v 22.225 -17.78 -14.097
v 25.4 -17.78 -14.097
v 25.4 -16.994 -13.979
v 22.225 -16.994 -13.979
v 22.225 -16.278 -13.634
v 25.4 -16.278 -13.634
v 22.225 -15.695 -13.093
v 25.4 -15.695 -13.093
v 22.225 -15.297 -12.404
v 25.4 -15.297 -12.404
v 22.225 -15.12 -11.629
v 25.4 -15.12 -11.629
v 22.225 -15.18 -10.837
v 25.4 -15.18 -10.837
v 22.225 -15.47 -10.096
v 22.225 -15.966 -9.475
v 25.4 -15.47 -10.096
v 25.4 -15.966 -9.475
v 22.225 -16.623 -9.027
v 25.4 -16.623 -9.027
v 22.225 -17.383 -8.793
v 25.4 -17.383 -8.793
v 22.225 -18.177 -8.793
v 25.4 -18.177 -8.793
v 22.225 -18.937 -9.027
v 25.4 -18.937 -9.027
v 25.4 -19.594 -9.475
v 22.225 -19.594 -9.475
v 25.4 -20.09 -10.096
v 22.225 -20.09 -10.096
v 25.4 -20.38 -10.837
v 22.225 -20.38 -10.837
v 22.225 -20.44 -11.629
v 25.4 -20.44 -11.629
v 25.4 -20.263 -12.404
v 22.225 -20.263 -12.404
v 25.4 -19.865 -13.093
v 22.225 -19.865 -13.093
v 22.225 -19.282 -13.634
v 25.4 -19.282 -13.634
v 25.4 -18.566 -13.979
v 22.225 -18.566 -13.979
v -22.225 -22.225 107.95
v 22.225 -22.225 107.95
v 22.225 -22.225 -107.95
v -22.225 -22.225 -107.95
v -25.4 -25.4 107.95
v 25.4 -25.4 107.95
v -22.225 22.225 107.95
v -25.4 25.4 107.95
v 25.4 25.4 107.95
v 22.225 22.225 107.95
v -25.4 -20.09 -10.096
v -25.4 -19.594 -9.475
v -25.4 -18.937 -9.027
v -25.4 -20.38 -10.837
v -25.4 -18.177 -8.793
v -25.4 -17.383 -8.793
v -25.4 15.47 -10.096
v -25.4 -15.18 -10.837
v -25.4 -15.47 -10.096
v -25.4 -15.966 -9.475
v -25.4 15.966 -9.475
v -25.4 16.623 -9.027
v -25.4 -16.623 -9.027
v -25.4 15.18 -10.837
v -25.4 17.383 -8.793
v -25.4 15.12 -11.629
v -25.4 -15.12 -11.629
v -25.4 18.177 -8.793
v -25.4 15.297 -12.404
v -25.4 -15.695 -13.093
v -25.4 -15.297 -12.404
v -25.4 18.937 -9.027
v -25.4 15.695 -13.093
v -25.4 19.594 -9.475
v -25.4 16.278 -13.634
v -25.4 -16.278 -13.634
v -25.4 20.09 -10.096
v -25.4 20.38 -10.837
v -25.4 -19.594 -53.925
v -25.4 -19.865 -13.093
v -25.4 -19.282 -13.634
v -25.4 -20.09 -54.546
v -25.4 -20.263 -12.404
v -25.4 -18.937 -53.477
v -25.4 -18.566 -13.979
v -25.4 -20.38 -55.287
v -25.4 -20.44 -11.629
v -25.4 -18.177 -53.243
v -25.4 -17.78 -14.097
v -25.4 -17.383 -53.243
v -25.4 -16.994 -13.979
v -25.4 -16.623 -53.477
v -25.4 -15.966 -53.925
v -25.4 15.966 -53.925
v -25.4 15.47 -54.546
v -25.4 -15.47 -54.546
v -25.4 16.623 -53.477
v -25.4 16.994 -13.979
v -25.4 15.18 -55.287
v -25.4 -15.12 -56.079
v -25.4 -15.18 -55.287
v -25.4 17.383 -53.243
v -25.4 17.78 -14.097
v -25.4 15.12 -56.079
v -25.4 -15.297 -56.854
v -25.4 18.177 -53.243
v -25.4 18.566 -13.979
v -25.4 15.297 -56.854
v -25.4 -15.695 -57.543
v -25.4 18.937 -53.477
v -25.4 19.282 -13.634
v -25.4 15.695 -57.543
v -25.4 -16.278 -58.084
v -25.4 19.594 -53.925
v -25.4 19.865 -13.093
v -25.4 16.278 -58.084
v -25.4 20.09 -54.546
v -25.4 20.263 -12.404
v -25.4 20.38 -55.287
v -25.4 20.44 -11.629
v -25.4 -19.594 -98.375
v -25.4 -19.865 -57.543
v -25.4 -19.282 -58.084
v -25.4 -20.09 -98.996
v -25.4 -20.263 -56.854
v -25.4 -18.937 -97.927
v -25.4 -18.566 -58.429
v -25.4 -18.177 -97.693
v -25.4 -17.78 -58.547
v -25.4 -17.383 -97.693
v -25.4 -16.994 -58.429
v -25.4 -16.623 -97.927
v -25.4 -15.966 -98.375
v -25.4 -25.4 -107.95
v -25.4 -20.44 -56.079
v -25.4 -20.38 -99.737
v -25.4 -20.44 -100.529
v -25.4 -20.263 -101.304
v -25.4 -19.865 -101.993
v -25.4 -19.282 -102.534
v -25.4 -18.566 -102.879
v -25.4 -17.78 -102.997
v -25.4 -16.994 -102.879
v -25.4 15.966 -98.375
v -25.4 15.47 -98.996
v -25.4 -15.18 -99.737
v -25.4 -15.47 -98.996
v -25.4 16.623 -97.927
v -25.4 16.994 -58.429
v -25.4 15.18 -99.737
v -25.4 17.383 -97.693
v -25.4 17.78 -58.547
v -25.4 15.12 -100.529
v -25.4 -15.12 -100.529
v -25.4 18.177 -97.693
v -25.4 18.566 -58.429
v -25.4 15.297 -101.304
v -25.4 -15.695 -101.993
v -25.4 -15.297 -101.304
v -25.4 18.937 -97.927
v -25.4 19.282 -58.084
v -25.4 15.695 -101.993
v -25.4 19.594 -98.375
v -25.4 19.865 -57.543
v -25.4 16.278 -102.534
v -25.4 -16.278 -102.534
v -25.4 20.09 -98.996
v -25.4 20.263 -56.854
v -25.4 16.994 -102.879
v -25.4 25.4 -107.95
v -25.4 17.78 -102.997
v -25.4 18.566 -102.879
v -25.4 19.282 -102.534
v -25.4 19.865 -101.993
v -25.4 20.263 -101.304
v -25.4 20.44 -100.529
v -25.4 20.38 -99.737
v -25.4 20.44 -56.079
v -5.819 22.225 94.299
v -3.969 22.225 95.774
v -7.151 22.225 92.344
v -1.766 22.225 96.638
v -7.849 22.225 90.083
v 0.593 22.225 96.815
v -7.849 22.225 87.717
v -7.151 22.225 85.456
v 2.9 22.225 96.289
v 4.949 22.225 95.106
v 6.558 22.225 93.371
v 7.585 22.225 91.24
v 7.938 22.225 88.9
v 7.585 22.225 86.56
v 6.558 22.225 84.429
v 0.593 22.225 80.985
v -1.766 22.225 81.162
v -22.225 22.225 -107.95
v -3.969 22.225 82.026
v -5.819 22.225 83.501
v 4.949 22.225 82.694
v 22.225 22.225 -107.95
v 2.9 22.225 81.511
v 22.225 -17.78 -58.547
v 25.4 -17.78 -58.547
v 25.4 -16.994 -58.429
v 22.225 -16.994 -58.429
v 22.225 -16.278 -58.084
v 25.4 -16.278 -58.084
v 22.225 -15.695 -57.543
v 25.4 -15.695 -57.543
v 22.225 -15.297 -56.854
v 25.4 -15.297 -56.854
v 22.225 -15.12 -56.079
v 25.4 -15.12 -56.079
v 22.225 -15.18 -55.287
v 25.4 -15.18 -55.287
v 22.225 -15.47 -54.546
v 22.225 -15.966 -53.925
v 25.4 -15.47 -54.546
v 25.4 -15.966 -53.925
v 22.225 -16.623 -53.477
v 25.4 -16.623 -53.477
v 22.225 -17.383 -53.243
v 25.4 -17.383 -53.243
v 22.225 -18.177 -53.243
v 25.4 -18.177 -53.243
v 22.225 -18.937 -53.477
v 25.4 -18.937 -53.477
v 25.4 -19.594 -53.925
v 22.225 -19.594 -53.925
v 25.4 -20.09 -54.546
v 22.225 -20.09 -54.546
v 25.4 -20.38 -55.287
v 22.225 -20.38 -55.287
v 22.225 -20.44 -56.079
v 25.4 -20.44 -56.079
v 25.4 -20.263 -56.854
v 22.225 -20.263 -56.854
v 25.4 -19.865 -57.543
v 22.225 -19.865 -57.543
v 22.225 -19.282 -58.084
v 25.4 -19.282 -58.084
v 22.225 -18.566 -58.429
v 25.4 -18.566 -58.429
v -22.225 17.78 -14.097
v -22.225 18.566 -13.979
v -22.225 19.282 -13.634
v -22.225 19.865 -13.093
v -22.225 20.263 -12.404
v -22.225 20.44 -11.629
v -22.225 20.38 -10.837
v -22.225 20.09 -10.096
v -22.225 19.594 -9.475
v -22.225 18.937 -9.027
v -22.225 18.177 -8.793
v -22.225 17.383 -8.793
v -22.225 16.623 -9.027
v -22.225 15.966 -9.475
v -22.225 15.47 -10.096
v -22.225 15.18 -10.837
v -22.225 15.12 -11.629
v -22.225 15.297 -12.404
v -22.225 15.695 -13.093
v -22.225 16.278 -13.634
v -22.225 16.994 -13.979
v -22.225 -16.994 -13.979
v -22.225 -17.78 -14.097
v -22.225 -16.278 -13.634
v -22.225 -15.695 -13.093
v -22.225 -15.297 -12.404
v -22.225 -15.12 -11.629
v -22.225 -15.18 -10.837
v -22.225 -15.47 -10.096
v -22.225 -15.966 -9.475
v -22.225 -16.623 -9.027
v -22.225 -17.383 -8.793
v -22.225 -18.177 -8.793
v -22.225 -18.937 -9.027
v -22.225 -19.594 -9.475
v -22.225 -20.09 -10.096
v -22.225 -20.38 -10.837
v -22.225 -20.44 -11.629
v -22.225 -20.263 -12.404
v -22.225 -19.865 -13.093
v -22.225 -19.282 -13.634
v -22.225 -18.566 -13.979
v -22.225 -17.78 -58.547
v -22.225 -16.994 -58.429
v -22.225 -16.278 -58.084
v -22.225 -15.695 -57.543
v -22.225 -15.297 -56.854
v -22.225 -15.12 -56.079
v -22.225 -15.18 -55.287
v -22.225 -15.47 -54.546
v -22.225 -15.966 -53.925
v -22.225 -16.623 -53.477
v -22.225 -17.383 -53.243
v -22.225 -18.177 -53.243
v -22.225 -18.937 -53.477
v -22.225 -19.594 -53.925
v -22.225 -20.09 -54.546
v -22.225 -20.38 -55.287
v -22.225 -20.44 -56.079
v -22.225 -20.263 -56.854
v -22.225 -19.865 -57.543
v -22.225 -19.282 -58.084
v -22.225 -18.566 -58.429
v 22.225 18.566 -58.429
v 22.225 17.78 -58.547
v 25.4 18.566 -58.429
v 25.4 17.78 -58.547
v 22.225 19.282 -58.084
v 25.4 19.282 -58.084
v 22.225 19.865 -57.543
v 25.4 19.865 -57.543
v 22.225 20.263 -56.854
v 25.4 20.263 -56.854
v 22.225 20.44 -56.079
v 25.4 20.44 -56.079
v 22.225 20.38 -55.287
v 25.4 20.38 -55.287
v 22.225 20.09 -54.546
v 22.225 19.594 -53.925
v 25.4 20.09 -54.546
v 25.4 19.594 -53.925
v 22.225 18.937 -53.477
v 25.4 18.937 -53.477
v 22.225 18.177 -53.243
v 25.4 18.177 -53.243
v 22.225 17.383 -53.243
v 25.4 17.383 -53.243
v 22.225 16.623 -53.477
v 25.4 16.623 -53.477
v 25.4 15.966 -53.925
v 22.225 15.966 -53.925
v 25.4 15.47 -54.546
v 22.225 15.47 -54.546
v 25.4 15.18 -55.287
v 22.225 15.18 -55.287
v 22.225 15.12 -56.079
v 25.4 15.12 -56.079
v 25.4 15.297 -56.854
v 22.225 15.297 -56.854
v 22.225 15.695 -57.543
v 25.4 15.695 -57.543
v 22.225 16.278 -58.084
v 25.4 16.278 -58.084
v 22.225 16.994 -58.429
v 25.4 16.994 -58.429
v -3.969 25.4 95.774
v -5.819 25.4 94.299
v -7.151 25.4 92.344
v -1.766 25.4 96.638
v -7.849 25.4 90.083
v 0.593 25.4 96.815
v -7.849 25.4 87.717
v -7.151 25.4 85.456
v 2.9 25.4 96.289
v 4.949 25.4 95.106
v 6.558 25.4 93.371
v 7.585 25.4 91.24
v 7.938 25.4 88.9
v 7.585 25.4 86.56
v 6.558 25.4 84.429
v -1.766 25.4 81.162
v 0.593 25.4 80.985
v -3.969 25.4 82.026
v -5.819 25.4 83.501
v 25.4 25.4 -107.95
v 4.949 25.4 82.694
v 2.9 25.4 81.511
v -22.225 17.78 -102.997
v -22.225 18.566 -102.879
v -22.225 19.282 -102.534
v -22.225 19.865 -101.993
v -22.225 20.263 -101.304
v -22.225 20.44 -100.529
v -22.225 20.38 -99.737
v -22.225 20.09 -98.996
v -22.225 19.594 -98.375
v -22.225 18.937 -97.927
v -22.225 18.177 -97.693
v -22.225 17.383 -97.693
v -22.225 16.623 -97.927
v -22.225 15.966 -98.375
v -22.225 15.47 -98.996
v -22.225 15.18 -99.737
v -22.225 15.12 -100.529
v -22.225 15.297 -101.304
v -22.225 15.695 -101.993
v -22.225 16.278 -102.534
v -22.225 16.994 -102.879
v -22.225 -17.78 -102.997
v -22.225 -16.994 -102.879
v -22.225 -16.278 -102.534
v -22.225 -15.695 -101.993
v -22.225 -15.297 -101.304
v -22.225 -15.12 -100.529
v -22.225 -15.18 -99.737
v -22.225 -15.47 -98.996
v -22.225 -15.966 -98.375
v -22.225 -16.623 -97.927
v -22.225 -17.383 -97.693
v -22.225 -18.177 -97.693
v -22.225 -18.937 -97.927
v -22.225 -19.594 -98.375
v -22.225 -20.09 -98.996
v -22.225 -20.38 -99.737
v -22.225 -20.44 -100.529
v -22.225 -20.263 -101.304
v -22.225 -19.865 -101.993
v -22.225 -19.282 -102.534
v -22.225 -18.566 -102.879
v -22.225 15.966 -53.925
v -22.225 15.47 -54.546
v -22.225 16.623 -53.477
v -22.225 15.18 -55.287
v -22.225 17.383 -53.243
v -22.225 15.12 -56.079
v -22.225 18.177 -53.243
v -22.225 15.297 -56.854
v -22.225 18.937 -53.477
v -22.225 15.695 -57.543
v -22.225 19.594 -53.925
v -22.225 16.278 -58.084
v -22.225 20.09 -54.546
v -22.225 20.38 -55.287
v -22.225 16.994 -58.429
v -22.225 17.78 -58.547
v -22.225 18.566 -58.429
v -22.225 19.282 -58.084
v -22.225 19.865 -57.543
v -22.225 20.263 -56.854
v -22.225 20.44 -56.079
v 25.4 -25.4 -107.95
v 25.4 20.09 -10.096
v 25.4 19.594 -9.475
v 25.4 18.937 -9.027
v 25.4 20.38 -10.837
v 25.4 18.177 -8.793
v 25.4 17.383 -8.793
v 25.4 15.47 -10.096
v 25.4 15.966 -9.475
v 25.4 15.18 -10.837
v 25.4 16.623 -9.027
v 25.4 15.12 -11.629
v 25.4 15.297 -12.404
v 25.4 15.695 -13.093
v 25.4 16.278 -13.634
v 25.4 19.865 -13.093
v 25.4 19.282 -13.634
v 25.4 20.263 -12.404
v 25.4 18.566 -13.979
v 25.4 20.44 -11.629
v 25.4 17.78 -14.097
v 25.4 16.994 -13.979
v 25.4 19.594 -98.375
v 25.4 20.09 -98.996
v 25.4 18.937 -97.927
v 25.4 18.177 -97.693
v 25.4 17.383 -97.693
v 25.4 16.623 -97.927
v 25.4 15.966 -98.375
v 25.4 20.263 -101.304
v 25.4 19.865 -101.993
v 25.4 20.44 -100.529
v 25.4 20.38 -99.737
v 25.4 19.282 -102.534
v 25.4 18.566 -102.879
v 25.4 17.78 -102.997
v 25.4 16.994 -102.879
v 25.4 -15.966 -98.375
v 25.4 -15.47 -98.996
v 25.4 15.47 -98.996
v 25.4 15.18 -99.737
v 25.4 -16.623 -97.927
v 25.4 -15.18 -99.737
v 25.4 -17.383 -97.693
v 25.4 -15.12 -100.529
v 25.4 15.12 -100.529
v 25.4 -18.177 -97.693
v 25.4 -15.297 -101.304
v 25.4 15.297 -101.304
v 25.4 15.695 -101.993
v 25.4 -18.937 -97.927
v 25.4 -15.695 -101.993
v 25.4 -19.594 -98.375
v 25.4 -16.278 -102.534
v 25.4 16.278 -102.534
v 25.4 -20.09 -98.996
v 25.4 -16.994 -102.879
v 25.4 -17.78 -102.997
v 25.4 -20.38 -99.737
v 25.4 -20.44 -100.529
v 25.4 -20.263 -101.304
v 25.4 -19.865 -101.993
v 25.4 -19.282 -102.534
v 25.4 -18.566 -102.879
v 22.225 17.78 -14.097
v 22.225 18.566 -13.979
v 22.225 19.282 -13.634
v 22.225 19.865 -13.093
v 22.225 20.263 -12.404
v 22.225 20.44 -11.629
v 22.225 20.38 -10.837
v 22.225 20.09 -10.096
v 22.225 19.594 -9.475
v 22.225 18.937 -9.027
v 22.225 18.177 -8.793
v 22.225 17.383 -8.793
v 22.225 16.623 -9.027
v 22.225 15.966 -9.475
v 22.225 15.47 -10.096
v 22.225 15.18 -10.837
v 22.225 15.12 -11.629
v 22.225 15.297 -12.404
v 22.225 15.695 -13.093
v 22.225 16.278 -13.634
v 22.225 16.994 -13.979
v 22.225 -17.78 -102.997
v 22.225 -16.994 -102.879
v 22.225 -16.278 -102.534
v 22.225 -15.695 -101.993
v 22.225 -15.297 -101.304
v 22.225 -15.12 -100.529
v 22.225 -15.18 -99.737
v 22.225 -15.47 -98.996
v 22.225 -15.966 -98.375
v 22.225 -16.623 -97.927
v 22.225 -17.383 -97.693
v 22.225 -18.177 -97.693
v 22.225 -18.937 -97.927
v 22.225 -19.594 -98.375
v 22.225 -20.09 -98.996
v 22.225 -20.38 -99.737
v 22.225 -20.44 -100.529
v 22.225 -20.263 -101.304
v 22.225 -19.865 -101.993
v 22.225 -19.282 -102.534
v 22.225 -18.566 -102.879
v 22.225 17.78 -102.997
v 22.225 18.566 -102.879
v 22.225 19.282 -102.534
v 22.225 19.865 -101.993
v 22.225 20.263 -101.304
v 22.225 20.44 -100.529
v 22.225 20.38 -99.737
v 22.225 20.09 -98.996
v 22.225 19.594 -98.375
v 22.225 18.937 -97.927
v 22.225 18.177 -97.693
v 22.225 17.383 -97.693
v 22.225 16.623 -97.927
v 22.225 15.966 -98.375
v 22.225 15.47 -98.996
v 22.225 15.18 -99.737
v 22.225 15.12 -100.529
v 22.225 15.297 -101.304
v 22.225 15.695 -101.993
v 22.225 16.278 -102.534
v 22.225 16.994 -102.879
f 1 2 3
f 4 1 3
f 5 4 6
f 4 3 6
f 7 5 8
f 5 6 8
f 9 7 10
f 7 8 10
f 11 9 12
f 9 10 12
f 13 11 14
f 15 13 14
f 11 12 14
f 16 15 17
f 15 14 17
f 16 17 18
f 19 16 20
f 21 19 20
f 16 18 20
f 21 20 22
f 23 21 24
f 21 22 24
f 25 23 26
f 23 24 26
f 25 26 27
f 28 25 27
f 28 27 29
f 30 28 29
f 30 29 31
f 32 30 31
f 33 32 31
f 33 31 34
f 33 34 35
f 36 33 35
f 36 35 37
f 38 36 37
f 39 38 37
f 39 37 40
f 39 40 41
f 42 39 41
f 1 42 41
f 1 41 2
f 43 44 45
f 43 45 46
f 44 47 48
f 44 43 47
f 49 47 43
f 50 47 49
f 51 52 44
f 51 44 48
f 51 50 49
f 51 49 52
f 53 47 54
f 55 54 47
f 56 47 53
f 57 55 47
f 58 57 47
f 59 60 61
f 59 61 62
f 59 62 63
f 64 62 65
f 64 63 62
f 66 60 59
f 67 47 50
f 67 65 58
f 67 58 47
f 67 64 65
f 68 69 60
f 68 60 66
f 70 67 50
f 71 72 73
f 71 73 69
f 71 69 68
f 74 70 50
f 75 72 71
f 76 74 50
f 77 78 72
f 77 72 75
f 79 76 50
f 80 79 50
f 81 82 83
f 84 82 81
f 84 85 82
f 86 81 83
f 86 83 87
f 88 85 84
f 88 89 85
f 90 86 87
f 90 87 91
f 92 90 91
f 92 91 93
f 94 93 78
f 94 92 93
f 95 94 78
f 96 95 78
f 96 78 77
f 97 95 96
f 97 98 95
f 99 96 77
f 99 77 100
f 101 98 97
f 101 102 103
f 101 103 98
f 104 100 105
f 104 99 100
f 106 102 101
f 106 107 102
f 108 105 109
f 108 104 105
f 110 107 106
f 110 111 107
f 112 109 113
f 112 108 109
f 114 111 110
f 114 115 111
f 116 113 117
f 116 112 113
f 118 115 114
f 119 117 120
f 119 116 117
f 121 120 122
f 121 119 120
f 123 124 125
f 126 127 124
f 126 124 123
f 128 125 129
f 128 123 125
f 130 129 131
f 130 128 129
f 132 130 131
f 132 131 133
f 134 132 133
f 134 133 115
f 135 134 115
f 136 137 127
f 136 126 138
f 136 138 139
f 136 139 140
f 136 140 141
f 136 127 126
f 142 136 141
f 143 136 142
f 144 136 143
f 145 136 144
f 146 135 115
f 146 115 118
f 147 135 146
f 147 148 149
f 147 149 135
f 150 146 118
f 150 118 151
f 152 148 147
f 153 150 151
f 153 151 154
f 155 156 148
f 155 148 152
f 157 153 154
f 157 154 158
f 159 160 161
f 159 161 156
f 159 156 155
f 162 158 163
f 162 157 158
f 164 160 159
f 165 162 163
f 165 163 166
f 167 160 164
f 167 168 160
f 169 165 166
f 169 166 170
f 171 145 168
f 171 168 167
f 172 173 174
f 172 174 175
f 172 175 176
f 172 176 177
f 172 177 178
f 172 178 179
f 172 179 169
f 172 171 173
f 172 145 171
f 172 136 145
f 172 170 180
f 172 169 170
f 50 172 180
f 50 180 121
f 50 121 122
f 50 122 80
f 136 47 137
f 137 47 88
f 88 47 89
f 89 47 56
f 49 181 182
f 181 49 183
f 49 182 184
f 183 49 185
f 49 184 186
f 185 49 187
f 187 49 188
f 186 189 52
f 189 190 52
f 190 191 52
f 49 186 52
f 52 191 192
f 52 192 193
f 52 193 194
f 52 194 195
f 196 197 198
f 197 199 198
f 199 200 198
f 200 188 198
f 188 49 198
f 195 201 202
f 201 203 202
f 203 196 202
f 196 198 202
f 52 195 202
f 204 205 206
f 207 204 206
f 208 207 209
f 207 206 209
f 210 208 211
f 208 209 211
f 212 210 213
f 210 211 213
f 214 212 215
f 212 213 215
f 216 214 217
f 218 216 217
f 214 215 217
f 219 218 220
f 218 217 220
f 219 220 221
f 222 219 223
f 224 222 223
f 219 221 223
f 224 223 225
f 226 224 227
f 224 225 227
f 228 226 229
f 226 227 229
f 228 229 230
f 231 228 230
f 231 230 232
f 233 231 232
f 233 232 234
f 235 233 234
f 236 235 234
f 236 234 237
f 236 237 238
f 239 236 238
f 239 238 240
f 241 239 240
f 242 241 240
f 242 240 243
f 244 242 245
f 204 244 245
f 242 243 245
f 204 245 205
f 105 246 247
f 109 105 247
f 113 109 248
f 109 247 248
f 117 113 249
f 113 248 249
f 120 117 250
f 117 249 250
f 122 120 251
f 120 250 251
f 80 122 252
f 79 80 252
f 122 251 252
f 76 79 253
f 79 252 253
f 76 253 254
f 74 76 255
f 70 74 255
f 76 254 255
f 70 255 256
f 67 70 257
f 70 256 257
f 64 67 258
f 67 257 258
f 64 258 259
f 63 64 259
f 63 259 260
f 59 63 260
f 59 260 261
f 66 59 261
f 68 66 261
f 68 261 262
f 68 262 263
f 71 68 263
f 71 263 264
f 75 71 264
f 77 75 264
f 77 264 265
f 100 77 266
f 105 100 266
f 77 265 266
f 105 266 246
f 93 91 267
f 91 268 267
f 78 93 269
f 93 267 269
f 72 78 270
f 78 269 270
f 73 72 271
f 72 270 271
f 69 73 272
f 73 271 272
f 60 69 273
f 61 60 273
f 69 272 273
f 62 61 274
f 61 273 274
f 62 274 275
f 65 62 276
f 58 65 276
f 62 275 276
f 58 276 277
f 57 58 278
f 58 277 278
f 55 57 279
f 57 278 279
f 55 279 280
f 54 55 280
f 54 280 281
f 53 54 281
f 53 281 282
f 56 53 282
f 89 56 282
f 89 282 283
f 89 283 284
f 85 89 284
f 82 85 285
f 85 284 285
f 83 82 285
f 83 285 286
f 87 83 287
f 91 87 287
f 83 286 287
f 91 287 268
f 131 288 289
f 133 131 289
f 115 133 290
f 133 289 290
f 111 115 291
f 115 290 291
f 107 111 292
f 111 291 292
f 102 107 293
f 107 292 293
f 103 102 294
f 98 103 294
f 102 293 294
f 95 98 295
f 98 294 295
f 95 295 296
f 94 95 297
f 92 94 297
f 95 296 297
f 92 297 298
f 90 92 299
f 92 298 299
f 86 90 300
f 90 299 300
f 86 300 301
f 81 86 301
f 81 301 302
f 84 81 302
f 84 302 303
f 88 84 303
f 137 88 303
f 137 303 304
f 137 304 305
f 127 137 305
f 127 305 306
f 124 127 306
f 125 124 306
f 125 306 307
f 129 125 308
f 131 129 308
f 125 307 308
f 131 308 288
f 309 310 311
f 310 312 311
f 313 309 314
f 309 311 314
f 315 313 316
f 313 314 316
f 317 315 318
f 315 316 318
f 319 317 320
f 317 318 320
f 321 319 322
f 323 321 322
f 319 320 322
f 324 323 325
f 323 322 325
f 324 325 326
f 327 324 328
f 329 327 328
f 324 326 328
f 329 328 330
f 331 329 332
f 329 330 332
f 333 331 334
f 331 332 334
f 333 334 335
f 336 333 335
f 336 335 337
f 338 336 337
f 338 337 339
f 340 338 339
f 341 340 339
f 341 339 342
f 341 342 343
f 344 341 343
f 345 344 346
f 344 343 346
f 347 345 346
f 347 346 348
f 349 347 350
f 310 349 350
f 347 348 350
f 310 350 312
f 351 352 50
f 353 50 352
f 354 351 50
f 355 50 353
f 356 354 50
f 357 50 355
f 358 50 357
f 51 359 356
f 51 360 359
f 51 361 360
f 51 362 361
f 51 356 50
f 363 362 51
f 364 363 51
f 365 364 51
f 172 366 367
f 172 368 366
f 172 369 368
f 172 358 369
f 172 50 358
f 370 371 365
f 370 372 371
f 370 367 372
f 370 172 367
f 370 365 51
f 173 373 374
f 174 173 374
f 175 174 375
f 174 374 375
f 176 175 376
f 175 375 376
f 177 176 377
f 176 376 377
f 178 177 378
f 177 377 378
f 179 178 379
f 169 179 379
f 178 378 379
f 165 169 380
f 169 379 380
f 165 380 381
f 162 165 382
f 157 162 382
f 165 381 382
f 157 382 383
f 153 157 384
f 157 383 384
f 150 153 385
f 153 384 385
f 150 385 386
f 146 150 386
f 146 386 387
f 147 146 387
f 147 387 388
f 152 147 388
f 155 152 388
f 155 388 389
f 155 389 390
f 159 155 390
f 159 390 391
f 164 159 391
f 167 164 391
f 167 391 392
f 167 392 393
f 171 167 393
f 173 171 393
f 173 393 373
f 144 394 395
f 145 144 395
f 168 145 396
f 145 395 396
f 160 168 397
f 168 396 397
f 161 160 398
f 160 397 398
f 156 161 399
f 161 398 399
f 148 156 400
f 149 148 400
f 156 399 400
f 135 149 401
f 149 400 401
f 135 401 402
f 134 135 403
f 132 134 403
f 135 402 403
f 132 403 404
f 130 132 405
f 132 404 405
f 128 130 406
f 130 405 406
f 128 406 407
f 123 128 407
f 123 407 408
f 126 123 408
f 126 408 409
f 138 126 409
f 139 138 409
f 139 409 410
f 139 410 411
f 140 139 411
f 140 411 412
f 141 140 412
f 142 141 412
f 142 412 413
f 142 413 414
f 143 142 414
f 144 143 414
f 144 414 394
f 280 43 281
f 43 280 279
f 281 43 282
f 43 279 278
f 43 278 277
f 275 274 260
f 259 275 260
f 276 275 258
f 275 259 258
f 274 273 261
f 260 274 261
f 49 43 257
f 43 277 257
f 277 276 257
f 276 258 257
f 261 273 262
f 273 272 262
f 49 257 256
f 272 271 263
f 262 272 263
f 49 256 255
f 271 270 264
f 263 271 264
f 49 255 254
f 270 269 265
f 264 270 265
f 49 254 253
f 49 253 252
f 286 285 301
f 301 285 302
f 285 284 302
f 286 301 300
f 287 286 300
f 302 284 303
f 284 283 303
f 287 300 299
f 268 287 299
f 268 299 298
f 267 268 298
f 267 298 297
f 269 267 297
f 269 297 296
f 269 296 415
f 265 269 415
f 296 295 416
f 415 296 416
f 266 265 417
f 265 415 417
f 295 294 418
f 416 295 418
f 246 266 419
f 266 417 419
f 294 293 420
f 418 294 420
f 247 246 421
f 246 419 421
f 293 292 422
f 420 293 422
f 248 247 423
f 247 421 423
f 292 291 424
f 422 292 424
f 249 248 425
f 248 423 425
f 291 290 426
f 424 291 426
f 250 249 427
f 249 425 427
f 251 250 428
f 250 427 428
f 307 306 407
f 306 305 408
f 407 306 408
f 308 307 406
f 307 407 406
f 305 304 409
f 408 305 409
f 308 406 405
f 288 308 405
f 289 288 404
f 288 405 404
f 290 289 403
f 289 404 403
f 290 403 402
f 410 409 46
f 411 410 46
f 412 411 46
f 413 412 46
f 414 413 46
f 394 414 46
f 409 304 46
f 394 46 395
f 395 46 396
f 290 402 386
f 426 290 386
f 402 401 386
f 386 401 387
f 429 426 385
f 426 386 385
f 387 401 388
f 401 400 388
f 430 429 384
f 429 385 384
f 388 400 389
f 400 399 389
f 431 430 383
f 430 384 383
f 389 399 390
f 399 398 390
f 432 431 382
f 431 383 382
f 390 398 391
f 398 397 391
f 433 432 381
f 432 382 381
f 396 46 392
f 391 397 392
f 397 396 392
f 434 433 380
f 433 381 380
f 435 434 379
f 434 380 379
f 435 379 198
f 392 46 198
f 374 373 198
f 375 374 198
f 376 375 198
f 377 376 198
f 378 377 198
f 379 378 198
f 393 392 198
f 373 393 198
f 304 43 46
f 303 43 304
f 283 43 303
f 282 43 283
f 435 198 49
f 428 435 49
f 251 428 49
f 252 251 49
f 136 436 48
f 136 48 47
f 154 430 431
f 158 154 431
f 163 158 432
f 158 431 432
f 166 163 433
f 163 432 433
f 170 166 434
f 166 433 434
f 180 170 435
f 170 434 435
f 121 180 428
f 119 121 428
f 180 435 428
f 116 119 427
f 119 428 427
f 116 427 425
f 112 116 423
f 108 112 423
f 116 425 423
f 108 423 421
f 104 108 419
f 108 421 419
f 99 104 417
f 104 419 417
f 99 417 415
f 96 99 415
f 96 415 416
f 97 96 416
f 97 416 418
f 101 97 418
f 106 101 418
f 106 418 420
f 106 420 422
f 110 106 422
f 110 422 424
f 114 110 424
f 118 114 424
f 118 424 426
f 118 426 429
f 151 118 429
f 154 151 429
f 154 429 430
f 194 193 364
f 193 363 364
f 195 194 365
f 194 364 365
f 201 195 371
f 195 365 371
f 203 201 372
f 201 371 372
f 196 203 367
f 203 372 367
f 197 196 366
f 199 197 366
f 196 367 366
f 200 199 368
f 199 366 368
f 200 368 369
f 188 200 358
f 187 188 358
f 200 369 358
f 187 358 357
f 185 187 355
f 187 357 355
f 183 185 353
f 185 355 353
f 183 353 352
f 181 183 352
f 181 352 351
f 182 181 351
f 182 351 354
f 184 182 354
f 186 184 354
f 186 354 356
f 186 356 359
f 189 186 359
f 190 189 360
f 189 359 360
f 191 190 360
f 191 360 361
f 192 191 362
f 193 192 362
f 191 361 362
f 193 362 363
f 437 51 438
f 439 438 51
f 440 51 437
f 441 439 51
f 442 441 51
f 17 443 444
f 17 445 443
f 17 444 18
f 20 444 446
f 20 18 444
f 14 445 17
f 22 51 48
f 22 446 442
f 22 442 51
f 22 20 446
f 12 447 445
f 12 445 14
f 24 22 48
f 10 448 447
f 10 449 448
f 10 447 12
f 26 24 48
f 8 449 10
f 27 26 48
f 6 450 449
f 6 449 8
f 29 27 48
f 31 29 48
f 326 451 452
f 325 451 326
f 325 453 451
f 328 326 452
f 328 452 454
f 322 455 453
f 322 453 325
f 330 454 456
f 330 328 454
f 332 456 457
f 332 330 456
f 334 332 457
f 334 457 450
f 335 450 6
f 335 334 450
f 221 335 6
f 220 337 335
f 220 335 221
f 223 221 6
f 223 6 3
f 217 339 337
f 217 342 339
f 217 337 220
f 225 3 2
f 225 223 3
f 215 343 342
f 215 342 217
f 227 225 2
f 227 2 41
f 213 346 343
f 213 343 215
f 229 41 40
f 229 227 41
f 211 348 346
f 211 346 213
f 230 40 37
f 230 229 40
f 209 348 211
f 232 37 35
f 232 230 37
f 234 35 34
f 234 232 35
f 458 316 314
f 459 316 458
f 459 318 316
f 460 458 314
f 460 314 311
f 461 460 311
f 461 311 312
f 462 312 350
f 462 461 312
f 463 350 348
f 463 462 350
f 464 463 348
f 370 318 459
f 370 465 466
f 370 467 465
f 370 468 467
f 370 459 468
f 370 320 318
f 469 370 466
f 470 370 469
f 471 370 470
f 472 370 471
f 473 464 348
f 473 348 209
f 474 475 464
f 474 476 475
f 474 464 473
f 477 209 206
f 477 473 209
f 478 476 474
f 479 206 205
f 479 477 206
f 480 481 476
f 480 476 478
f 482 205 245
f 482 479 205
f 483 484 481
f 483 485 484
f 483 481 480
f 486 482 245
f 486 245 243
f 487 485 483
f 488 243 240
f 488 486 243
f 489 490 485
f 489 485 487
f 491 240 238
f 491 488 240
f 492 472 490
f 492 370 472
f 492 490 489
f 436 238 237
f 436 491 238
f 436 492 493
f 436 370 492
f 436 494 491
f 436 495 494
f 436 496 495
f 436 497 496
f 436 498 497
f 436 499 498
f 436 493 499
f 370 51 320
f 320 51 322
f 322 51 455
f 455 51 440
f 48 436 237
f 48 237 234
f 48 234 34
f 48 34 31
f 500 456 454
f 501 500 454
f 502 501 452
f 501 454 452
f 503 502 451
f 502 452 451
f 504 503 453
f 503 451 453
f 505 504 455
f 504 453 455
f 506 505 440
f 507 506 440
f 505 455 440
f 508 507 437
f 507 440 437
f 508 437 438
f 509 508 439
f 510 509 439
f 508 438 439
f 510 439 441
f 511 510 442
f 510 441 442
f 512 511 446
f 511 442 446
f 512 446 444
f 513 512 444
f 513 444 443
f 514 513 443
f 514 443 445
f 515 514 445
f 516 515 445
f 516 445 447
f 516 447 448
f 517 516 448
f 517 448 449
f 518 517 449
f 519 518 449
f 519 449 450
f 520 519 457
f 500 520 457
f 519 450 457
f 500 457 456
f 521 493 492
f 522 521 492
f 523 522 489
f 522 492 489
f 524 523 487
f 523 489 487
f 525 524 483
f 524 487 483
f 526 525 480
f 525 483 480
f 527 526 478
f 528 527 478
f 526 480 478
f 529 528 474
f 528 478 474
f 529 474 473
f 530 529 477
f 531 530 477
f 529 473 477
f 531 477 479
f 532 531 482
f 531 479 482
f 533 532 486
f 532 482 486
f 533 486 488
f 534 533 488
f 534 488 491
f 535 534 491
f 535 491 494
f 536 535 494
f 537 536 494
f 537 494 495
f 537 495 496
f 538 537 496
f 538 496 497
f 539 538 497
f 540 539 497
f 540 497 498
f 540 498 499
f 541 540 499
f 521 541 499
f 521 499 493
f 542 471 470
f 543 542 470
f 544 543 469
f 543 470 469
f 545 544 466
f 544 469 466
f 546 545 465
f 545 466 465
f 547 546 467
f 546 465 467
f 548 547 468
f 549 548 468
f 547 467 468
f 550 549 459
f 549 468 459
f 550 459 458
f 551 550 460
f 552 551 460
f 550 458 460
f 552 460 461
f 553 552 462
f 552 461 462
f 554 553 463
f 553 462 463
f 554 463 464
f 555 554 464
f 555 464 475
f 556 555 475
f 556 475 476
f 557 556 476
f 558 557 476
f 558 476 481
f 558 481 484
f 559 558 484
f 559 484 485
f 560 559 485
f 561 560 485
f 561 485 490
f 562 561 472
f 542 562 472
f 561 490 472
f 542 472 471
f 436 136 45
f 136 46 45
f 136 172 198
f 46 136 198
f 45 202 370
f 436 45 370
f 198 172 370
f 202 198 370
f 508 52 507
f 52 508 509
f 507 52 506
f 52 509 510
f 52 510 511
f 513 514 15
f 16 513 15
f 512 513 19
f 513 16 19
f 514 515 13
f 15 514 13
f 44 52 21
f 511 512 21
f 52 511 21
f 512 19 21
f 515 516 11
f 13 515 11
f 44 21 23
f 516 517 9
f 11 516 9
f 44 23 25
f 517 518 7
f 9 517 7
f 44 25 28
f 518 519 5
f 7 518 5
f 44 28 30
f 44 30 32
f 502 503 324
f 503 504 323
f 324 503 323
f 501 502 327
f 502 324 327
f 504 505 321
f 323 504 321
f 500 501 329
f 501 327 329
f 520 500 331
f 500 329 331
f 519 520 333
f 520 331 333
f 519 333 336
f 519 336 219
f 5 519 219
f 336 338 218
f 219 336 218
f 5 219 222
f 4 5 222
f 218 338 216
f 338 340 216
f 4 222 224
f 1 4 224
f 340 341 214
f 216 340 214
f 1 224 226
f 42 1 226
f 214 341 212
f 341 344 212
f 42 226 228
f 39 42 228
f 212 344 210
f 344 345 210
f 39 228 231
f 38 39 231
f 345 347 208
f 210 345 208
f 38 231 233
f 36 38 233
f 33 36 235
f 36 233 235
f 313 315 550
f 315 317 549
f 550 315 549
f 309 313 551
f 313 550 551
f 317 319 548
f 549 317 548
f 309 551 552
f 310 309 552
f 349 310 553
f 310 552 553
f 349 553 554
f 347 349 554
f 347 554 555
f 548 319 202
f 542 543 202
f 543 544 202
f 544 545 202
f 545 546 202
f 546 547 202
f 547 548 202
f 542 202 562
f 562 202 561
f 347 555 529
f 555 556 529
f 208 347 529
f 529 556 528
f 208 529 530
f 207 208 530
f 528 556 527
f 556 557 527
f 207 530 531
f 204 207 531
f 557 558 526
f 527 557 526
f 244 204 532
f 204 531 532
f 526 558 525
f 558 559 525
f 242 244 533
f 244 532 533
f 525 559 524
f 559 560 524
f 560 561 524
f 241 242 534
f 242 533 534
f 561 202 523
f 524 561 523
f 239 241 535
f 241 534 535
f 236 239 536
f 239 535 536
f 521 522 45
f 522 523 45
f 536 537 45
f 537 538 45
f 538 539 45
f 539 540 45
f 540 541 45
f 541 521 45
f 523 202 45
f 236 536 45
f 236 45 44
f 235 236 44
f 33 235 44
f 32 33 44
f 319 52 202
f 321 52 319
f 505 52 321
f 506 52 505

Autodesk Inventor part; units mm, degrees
ref_plane "YZ Plane" through (0, 0, 0) normal (1, 0, 0) x (0, 1, 0)
ref_plane "XZ Plane" through (0, 0, 0) normal (0, 1, 0) x (-1, 0, 0)
ref_plane "XY Plane" through (0, 0, 0) normal (0, 0, 1) x (1, 0, 0)
sketch "Sketch1" plane through (0, 0, 0) normal (0, 0, 1) x (1, 0, 0)
  line L0 (-35.56, 0) -> (35.56, 0) construction
  line L1 (0, -35.56) -> (0, 35.56) construction
  line L2 (-25.4, 25.4) -> (25.4, 25.4)
  line L3 (25.4, 25.4) -> (25.4, -25.4)
  line L4 (25.4, -25.4) -> (-25.4, -25.4)
  line L5 (-25.4, -25.4) -> (-25.4, 25.4)
  line L6 (-22.225, 22.225) -> (22.225, 22.225)
  line L7 (22.225, 22.225) -> (22.225, -22.225)
  line L8 (22.225, -22.225) -> (-22.225, -22.225)
  line L9 (-22.225, -22.225) -> (-22.225, 22.225)
  point P0 (0, 0)
  point P1 (-25.4, 0)
  point P2 (0, 25.4)
  point P3 (-22.225, 0)
  point P4 (0, 22.225)
  dimension "d0" = 50.8
  dimension "d1" = 3.175
extrude "Extrusion1" add sketch "Sketch1" along normal mid plane 215.9
sketch "Sketch2" plane through (25.4, -25.4, 107.95) normal (1, 0, 0) x (0, 0, -1)
  line L0 (268.3764, 25.4) -> (-44.7294, 25.4) construction
  line L1 (107.95, -10.16) -> (107.95, 60.96) construction
  line L2 (119.38, 7.62) -> (208.28, 7.62) construction
  line L3 (208.28, 7.62) -> (208.28, 43.18) construction
  line L4 (208.28, 43.18) -> (119.38, 43.18) construction
  line L5 (119.38, 43.18) -> (119.38, 7.62) construction
  circle A0 centre (119.38, 43.18) radius 2.667
  circle A1 centre (119.38, 7.62) radius 2.667
  circle A2 centre (163.83, 7.62) radius 2.667
  circle A3 centre (208.28, 7.62) radius 2.667
  circle A4 centre (208.28, 43.18) radius 2.667
  circle A5 centre (163.83, 43.18) radius 2.667
  line L6 (215.9, 50.8) -> (215.9, 0) construction
  point P0 (107.95, 25.4)
  point P1 (208.28, 25.4)
  dimension "d4" = 5.334
  dimension "d5" = 7.62
  dimension "d6" = 88.9
  dimension "d7" = 17.78
extrude "Extrusion2" cut sketch "Sketch2" against normal through all
sketch "Sketch4" plane through (-25.4, 25.4, 107.95) normal (0, 1, 0) x (1, 0, 0)
  line L0 (25.4, 259.08) -> (25.4, -43.18) construction
  line L1 (-10.16, 107.95) -> (60.96, 107.95) construction
  circle A0 centre (25.4, 19.05) radius 7.9375
  line L2 (50.8, 0) -> (0, 0) construction
  line L3 (38.1, 6.35) -> (12.7, 6.35) construction
  line L4 (12.7, 6.35) -> (12.7, 31.75) construction
  line L5 (12.7, 31.75) -> (38.1, 31.75) construction
  line L6 (38.1, 31.75) -> (38.1, 6.35) construction
  line L7 (38.1, 19.05) -> (12.7, 19.05) construction
  circle A1 centre (38.1, 6.35) radius 2.413 construction
  circle A2 centre (12.7, 6.35) radius 2.413 construction
  circle A3 centre (12.7, 31.75) radius 2.413 construction
  circle A4 centre (38.1, 31.75) radius 2.413 construction
  point P0 (25.4, 107.95)
  point P1 (25.4, 6.35)
  dimension "d13" = 15.875
  dimension "d14" = 19.05
  dimension "d17" = 4.826
  dimension "d18" = 25.4
extrude "Extrusion6" cut sketch "Sketch4" against normal up to next
properties part number "Arm 18 inch" material "Aluminum 6061"
